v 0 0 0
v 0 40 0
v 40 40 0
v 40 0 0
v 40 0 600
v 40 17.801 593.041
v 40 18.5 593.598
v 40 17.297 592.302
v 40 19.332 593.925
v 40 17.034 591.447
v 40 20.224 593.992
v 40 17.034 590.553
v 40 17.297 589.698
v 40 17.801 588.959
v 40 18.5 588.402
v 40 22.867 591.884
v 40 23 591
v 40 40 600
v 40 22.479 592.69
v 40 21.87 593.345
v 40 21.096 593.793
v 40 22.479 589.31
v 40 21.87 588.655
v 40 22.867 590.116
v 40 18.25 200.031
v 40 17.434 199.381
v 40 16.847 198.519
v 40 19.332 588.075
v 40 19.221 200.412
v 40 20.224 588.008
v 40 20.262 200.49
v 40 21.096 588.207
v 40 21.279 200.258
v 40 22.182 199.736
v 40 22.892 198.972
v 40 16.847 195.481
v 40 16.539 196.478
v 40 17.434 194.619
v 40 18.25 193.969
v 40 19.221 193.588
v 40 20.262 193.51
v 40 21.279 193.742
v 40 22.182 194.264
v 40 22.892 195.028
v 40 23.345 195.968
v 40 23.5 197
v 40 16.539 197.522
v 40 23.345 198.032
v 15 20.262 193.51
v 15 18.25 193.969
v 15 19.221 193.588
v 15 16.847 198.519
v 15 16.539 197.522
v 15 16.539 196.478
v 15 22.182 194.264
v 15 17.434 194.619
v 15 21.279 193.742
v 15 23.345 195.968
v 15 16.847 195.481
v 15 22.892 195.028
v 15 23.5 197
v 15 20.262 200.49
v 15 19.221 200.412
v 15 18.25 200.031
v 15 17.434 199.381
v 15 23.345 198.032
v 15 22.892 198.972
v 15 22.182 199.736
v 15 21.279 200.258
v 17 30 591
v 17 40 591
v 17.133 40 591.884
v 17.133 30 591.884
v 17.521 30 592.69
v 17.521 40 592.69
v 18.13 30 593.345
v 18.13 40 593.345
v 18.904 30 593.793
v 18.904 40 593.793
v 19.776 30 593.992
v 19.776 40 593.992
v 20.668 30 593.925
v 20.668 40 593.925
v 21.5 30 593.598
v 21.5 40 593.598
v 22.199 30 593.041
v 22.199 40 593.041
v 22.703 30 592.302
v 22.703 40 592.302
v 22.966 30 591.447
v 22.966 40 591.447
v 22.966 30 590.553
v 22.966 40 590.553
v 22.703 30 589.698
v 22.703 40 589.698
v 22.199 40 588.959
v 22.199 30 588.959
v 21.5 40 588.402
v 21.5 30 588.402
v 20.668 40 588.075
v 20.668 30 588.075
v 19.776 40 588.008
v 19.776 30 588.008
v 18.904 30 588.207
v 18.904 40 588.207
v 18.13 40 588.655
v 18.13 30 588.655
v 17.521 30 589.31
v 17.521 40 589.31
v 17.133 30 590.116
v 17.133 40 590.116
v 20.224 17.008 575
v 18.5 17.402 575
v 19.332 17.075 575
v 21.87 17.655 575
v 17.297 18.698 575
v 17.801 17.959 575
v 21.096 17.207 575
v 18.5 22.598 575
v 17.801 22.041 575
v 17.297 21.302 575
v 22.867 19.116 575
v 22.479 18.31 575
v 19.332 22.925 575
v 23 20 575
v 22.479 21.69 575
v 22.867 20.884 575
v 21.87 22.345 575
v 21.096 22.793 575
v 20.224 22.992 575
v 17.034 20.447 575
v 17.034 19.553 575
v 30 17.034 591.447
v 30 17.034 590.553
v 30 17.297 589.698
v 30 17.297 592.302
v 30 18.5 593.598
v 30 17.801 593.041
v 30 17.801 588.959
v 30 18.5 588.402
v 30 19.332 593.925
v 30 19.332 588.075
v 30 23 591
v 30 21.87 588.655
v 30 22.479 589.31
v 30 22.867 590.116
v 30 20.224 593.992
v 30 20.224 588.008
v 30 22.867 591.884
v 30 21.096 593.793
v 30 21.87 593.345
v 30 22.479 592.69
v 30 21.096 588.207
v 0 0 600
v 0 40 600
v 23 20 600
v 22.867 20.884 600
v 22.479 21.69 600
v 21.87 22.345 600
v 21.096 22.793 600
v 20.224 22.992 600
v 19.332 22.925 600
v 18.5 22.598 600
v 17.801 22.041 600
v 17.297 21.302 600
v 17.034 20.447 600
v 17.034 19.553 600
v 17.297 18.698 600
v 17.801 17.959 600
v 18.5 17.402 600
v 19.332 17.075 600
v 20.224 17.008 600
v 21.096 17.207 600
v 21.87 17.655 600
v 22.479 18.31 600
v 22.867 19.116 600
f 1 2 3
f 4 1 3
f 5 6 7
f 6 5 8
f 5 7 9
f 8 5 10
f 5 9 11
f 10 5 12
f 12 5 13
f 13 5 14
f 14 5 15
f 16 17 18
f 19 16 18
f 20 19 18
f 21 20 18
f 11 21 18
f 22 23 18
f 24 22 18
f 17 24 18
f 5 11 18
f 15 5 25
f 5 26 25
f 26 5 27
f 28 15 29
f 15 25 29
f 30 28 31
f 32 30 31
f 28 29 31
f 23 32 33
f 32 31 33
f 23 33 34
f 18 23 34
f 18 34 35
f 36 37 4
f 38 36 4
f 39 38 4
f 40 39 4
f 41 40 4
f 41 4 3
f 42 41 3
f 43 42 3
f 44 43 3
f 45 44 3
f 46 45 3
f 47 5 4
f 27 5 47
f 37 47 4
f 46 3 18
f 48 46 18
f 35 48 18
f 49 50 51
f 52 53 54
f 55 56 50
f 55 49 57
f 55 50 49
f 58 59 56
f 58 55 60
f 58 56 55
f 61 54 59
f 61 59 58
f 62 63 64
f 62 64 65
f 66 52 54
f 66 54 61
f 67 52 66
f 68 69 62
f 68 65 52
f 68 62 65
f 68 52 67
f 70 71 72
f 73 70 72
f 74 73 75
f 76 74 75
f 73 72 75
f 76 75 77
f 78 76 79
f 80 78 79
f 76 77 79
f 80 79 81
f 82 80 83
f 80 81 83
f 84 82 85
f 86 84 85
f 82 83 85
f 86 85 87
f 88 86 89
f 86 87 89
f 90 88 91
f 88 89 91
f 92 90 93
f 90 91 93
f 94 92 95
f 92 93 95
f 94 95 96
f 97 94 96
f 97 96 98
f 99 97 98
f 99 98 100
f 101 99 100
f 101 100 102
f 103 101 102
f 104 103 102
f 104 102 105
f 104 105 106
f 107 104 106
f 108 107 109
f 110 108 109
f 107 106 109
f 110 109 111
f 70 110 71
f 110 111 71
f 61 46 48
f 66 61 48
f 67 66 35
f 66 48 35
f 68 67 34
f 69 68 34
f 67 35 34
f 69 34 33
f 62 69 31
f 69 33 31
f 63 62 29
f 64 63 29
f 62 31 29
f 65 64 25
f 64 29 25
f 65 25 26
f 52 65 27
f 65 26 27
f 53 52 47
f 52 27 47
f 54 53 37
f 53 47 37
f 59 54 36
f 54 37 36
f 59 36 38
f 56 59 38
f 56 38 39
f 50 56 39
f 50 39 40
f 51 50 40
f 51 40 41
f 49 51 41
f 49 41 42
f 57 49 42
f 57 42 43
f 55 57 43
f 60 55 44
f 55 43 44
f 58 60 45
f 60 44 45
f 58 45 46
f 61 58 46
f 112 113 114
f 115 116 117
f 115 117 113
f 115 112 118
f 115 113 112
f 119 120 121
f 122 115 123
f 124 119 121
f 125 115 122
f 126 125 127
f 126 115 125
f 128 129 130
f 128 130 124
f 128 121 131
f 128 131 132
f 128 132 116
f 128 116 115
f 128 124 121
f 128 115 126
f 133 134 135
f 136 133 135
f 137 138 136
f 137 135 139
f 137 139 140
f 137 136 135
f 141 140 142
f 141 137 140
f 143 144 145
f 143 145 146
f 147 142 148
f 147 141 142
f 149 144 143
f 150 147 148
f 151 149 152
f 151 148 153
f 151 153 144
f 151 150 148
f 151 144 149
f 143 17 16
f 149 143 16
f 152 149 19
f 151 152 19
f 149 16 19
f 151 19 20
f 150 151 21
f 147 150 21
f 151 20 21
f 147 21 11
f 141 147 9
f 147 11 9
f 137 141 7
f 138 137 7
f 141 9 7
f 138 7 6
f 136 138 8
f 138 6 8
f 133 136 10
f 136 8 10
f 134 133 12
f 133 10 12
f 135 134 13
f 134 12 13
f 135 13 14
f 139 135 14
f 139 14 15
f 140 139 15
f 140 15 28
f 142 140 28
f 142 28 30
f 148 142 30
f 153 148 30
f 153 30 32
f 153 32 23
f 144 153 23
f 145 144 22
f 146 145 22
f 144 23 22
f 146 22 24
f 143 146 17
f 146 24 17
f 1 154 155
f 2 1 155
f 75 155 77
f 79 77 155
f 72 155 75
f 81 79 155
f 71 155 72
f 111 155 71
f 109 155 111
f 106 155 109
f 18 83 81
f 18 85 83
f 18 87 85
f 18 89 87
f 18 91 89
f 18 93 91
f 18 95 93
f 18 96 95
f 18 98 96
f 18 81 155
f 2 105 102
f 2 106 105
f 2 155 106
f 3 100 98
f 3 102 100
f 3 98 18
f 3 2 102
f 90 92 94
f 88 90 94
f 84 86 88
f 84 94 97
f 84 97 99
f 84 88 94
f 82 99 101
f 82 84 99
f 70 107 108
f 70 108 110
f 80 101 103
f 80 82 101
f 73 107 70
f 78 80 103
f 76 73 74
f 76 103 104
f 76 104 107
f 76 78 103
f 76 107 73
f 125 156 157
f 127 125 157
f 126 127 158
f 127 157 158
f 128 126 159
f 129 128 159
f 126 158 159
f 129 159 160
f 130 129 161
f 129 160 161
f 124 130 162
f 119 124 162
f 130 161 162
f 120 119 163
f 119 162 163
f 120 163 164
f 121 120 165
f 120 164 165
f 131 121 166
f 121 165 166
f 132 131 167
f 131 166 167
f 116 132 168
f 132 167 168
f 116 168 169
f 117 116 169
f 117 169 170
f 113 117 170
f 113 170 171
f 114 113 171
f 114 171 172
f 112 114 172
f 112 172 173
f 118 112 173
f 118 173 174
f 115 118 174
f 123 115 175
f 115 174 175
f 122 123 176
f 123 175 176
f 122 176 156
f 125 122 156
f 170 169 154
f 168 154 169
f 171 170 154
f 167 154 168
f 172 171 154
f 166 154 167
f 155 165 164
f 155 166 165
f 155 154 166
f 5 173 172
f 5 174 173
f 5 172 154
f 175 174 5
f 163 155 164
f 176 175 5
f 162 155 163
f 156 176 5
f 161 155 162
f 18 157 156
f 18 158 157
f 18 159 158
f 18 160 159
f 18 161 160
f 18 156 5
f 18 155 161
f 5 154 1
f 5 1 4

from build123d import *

# Parameters (mm, degrees)
F0_W     = 40
F0_H     = 40
F1_DEPTH = 600
F2_R     = 3
F3_DEPTH = 25
F4_R     = 3
F5_DEPTH = 10
F6_R     = 3
F7_DEPTH = 10
F8_R     = 3.5
F9_DEPTH = 25


with BuildPart() as f1:
    # F0 (on Top) → F1 (new body)
    with BuildSketch(Plane.XY):
        with Locations((20, 20)):
            Rectangle(F0_W, F0_H)
    extrude(amount=F1_DEPTH)

    # F2 (on face) → F3 (cut)
    with BuildSketch(Plane.XY.offset(600)):
        with Locations((20, 20)):
            Circle(F2_R)
    extrude(amount=-F3_DEPTH, mode=Mode.SUBTRACT)

    # F4 (on face) → F5 (cut)
    with BuildSketch(Plane.YZ.offset(40)):
        with Locations((20, 591)):
            Circle(F4_R)
    extrude(amount=-F5_DEPTH, mode=Mode.SUBTRACT)

    # F6 (on face) → F7 (cut)
    with BuildSketch(Plane(origin=(0, 40, 0), x_dir=(-1, 0, 0), z_dir=(0, 1, 0))):
        with Locations((-20, 591)):
            Circle(F6_R)
    extrude(amount=-F7_DEPTH, mode=Mode.SUBTRACT)

    # F8 (on face) → F9 (cut)
    with BuildSketch(Plane.YZ.offset(40)):
        with Locations((20, 197)):
            Circle(F8_R)
    extrude(amount=-F9_DEPTH, mode=Mode.SUBTRACT)


solid = f1.part
